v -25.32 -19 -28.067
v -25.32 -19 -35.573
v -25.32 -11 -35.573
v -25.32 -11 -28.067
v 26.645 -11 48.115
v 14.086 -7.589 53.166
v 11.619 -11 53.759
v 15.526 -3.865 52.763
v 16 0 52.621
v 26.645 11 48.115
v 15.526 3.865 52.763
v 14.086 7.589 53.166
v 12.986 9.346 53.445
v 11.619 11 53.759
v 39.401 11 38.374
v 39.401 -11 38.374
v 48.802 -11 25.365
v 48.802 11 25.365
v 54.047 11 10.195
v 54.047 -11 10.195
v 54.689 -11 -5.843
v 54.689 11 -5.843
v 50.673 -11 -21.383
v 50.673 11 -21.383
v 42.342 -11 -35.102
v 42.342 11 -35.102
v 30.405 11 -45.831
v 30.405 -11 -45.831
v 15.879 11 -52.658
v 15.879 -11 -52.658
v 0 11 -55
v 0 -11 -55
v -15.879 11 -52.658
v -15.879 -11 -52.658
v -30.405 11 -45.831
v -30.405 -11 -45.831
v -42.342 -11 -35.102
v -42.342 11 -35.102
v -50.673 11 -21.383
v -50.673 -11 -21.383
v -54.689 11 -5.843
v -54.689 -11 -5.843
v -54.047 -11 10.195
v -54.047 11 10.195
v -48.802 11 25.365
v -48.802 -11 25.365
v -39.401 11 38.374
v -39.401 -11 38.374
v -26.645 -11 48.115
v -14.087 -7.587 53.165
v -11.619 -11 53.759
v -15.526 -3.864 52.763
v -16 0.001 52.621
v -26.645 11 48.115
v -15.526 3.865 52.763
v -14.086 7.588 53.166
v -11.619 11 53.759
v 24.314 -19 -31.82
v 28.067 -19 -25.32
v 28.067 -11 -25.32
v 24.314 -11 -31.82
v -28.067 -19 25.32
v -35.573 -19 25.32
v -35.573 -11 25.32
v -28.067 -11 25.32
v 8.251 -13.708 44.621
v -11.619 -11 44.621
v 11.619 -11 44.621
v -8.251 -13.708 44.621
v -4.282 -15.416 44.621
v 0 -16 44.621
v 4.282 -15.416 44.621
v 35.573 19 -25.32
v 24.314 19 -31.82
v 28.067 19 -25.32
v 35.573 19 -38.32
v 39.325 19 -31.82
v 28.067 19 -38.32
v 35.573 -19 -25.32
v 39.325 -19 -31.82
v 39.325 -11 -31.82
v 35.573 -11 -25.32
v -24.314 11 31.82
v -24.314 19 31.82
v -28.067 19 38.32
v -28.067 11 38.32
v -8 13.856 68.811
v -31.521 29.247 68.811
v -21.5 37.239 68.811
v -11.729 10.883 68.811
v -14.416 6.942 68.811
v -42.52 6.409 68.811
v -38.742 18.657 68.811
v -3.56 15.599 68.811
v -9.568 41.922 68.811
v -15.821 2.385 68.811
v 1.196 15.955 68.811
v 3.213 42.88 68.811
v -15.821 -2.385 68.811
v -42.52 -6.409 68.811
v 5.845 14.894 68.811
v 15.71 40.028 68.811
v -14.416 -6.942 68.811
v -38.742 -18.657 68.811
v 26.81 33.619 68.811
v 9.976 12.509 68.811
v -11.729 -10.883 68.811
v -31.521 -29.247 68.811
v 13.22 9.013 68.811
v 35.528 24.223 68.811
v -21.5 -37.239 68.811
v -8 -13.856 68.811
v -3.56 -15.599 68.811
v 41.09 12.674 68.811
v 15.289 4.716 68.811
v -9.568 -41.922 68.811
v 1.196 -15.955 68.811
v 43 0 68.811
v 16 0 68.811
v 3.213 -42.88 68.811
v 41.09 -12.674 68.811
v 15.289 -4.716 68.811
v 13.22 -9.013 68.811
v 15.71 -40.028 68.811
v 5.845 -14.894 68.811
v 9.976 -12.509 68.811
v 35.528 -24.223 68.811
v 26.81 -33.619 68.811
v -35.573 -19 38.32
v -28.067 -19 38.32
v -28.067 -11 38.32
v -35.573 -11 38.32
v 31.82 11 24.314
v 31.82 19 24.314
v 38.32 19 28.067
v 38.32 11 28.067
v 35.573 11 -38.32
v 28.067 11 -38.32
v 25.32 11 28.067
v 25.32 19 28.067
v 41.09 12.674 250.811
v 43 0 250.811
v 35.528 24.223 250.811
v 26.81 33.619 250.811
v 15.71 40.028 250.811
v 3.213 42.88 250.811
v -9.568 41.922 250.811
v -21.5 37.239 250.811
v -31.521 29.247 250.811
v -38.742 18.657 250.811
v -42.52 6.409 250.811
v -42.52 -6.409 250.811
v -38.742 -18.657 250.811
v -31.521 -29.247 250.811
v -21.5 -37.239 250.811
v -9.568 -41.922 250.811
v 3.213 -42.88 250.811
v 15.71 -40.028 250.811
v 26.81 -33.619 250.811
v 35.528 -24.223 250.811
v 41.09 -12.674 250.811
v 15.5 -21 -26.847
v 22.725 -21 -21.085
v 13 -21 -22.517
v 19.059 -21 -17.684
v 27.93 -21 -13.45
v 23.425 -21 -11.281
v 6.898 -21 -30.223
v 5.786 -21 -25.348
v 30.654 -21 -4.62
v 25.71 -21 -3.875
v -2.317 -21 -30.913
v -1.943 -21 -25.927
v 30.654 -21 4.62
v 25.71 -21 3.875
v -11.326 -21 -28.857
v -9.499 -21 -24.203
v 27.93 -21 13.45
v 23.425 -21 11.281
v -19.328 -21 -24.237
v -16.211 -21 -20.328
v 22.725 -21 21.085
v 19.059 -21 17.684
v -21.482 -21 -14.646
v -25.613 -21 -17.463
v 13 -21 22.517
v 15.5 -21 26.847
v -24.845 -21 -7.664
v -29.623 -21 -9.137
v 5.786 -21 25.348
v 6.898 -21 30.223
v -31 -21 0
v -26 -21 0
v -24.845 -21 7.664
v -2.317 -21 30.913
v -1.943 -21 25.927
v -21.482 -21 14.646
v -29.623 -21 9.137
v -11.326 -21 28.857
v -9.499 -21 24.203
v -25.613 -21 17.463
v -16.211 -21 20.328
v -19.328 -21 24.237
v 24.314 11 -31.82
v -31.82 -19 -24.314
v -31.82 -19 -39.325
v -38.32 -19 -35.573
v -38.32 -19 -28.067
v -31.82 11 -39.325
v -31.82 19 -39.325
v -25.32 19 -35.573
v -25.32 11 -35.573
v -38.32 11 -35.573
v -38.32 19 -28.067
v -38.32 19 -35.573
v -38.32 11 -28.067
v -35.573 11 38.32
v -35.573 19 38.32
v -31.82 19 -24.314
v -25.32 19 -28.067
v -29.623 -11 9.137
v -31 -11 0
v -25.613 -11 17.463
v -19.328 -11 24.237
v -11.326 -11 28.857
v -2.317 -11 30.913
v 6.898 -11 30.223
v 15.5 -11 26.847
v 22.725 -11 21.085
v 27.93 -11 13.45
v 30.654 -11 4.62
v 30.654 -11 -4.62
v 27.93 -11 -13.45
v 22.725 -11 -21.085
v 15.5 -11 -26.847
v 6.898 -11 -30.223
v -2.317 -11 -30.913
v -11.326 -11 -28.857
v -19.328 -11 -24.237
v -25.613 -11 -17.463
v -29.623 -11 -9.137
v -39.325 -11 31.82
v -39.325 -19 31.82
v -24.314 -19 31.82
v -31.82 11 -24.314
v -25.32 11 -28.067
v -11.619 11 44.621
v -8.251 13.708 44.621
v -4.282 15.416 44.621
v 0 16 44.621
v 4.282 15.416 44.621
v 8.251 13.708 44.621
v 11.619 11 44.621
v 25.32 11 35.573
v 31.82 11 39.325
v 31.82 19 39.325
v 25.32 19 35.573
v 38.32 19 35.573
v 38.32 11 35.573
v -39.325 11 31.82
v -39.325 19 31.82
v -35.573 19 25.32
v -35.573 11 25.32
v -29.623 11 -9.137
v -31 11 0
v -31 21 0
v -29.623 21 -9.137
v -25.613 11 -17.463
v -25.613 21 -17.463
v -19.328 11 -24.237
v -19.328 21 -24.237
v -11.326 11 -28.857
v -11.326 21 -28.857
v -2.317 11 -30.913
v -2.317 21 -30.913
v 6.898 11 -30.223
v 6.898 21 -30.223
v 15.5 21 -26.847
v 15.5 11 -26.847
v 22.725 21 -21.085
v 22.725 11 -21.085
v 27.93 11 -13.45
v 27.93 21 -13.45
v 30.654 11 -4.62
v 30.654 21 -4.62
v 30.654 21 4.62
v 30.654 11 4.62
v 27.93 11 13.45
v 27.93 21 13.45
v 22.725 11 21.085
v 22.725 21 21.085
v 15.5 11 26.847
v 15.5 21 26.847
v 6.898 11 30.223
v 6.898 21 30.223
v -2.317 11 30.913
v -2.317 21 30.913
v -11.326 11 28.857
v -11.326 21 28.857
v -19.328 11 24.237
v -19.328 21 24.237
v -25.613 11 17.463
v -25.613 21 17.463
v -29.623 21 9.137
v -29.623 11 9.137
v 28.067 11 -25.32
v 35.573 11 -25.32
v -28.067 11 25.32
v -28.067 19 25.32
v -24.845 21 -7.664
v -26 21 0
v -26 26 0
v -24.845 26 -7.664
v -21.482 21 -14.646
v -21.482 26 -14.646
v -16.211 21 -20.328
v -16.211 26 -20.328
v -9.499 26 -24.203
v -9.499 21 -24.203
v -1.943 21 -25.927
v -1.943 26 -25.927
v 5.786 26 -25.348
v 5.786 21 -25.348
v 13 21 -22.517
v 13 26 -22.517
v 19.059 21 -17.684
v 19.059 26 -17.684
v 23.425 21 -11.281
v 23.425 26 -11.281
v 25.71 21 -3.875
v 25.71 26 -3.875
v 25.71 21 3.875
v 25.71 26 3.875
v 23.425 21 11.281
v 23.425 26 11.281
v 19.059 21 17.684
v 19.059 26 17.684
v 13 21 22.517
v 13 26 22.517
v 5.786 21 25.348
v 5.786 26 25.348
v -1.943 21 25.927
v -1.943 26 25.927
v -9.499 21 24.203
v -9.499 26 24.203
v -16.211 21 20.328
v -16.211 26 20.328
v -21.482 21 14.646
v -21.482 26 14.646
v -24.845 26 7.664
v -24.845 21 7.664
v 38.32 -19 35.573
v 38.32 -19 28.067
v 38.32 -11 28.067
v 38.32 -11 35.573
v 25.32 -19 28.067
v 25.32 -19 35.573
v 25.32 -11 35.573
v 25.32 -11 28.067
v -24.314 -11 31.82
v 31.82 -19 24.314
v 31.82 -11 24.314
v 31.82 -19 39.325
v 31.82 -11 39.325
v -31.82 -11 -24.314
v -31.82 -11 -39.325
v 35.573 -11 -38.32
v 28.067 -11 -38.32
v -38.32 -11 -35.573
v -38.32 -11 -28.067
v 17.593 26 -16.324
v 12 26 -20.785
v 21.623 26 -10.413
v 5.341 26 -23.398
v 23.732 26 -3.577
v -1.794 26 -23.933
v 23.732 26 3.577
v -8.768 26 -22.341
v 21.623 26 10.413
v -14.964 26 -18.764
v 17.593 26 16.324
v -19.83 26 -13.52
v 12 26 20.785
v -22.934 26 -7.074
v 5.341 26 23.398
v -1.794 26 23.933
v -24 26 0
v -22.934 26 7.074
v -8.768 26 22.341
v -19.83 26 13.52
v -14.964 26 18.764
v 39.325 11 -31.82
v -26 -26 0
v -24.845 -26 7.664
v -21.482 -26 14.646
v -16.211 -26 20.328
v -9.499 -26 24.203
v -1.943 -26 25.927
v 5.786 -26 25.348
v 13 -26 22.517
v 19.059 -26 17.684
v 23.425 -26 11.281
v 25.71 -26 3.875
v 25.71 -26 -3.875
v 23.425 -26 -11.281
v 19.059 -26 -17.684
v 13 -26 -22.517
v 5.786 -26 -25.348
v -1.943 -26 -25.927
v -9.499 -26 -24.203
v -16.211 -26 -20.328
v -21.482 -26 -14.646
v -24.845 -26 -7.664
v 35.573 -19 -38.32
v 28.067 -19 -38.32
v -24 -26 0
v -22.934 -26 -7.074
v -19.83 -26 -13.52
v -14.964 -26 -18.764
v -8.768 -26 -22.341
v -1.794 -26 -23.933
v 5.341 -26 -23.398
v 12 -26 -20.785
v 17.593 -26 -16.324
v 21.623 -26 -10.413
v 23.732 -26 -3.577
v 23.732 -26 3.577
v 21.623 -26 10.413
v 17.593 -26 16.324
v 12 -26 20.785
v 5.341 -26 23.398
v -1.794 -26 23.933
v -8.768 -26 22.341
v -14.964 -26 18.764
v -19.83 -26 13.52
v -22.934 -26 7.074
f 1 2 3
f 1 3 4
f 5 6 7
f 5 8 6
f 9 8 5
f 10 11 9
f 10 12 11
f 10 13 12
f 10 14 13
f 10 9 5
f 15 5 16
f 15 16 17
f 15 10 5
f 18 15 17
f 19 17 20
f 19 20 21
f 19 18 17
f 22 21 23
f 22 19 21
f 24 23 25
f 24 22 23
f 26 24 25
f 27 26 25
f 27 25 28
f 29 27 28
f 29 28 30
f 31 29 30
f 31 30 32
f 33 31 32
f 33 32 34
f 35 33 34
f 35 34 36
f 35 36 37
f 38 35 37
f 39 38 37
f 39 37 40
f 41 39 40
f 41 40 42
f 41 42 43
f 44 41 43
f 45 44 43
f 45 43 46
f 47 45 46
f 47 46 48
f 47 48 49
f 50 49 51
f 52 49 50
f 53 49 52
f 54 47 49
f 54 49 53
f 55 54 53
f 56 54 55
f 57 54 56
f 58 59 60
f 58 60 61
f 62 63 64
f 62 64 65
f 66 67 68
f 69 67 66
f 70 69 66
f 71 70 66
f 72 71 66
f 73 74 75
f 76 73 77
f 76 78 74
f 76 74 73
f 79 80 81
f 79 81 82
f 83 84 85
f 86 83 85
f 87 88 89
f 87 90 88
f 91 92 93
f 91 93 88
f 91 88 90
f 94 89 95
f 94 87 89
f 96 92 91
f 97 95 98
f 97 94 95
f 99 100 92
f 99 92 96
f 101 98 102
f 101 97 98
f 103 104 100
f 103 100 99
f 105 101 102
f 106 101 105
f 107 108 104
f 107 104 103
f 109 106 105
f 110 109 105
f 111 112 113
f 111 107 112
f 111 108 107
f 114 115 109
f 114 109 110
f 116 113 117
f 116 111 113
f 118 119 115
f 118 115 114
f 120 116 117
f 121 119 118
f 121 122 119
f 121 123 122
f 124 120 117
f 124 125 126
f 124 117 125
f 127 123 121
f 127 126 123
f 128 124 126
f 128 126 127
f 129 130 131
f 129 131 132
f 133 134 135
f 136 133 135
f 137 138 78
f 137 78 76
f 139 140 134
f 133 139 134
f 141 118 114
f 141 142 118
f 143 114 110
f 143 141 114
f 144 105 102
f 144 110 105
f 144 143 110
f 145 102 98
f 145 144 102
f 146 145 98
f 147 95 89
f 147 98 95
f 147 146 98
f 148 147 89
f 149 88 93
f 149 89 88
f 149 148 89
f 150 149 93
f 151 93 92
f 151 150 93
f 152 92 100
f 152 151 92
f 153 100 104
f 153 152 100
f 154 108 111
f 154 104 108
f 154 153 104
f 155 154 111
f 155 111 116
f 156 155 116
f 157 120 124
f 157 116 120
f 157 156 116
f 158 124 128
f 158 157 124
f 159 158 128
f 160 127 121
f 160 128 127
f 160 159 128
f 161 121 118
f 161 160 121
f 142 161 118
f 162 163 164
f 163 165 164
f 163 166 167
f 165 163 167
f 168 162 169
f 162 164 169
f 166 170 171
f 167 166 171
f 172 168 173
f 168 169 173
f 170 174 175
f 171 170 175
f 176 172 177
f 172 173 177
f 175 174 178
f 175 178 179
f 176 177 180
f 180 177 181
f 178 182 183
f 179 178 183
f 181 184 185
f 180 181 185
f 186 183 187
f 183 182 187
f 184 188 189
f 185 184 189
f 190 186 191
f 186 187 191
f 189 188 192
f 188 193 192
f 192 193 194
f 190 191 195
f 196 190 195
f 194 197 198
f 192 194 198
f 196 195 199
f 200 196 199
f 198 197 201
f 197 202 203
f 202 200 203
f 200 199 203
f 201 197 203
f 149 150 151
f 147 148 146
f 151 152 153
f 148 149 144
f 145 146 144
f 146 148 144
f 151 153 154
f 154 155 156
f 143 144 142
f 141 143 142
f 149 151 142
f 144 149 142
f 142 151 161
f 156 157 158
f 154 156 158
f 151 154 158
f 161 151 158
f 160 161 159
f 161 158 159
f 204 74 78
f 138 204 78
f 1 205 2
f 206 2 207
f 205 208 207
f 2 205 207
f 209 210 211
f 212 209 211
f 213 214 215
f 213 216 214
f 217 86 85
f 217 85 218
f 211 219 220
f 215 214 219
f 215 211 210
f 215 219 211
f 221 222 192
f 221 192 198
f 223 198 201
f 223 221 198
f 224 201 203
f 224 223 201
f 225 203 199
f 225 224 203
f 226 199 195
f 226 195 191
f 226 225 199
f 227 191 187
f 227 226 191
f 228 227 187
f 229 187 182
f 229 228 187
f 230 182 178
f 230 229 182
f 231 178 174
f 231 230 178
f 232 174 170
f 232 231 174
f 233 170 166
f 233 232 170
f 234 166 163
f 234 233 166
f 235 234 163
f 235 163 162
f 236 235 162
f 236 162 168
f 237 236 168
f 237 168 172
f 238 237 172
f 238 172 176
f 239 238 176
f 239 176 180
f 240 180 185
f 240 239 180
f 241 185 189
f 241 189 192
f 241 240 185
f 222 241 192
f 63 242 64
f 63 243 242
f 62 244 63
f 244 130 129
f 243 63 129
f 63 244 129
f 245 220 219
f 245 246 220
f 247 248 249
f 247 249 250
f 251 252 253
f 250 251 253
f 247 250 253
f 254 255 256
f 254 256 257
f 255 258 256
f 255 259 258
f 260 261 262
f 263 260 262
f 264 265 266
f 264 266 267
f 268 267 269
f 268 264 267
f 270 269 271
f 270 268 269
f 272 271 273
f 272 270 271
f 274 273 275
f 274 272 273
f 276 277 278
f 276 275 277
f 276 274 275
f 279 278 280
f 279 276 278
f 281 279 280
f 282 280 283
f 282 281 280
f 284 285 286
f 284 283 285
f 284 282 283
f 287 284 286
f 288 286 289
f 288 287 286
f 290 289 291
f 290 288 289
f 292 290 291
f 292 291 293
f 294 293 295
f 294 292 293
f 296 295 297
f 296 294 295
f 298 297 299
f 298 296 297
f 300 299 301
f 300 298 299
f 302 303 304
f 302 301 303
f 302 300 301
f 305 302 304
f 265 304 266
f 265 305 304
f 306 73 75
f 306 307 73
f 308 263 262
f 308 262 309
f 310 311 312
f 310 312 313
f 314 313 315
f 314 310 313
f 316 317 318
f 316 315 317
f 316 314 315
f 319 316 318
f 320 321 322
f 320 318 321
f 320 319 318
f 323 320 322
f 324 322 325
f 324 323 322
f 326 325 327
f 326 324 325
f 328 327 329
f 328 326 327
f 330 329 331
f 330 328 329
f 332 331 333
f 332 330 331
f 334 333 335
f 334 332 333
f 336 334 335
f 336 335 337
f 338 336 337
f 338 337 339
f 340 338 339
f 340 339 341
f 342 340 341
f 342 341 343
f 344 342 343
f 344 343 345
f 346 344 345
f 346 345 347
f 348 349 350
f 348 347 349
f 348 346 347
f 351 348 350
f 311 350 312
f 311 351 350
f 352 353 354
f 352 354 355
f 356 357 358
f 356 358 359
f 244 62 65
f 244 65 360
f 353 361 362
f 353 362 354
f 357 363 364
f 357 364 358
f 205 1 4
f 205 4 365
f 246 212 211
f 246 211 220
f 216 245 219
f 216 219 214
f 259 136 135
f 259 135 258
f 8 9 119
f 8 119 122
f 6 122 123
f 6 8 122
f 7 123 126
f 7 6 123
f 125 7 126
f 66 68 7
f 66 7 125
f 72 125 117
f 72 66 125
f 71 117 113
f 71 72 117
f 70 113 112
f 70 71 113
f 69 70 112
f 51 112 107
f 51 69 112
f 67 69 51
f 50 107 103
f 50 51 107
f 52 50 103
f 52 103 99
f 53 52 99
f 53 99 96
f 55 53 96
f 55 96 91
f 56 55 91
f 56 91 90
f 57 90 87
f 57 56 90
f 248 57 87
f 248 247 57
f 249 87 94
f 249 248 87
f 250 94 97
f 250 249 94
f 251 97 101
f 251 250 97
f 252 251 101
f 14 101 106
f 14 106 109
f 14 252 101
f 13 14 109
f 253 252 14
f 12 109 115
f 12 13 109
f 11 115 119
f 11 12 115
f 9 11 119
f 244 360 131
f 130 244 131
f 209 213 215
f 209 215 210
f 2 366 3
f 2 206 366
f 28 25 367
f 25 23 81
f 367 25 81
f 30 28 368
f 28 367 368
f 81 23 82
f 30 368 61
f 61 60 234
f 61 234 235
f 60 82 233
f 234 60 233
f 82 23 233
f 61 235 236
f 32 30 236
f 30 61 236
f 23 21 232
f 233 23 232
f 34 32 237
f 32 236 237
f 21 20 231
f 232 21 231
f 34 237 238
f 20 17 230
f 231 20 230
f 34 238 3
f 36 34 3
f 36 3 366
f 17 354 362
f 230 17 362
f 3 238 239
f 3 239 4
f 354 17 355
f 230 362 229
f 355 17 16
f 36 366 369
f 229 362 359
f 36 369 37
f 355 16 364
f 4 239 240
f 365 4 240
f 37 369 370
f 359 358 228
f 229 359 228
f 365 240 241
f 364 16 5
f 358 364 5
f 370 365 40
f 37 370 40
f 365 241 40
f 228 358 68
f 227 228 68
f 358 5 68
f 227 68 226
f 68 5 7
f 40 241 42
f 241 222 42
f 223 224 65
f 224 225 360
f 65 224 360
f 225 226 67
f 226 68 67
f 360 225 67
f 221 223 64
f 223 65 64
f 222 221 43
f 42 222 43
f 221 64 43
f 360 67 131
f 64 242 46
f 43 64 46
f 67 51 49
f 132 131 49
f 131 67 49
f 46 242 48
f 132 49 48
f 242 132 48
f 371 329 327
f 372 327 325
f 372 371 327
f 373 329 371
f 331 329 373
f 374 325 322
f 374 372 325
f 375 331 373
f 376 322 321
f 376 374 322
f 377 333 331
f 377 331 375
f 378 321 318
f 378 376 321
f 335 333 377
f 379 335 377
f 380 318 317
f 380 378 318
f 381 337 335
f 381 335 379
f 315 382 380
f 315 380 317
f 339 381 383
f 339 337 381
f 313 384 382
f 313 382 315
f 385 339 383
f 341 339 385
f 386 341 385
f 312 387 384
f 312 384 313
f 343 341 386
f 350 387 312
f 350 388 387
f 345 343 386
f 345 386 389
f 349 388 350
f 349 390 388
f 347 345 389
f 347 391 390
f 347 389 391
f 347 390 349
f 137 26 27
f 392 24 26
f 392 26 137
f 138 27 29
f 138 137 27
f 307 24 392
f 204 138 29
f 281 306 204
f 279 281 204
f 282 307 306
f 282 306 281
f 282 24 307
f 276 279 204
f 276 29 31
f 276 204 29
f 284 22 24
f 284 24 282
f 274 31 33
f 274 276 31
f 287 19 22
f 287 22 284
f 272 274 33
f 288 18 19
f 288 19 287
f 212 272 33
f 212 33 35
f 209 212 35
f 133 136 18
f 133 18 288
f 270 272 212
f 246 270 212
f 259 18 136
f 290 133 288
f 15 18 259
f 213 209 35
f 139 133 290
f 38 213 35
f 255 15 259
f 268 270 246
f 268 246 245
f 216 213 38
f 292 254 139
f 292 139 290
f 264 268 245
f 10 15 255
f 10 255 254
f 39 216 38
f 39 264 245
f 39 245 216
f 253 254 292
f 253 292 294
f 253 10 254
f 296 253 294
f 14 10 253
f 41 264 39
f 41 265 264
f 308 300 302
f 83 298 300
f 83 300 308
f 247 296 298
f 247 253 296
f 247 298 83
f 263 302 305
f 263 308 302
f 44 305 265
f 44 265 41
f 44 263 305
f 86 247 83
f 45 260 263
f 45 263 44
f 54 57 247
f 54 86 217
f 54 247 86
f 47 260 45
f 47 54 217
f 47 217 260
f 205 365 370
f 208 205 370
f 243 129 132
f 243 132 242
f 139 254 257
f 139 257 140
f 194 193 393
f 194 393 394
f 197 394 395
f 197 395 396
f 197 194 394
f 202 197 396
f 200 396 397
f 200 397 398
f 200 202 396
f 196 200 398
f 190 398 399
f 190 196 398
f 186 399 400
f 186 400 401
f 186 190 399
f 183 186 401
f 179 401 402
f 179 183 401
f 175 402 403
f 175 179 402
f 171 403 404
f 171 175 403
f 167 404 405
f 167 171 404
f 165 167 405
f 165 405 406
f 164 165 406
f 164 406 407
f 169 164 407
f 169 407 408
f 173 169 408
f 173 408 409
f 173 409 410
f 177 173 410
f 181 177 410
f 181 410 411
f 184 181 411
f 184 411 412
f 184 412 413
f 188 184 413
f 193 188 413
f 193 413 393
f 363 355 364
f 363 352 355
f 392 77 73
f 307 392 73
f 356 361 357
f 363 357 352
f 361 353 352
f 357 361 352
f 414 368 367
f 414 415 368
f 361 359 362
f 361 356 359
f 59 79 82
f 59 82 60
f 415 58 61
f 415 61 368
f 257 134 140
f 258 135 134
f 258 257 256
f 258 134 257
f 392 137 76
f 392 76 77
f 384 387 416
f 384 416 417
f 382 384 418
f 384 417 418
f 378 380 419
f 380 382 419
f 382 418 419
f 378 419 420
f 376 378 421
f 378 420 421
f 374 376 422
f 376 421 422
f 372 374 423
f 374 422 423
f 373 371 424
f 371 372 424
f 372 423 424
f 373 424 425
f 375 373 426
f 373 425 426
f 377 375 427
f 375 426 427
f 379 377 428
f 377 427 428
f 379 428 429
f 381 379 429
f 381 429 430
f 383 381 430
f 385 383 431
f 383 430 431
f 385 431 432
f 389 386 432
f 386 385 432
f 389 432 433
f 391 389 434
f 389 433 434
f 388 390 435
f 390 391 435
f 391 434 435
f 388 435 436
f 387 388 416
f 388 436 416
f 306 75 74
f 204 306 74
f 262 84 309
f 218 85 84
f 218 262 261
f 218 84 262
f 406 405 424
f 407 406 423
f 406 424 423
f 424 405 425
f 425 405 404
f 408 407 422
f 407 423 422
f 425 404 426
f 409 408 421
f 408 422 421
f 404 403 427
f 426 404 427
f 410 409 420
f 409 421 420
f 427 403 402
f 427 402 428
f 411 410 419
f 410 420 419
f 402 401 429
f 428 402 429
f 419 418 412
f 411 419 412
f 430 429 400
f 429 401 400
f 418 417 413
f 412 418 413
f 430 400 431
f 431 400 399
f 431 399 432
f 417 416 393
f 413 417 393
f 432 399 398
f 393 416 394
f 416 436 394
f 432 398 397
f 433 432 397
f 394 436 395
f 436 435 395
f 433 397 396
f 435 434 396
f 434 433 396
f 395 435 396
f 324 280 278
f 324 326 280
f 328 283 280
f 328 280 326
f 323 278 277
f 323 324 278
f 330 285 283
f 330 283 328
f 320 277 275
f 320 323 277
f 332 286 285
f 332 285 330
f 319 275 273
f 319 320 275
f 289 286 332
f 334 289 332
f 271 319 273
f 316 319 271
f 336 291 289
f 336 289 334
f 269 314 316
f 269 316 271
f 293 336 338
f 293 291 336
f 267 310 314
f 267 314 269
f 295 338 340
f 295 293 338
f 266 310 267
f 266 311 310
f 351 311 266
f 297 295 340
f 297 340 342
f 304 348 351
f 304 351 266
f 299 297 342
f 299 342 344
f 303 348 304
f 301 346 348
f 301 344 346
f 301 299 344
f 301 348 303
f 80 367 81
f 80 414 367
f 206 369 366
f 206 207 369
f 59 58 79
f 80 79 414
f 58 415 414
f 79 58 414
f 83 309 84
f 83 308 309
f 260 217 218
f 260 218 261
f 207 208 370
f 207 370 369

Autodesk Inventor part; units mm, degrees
ref_plane "YZ Plane" through (0, 0, 0) normal (1, 0, 0) x (0, 1, 0)
ref_plane "XZ Plane" through (0, 0, 0) normal (0, 1, 0) x (-1, 0, 0)
ref_plane "XY Plane" through (0, 0, 0) normal (0, 0, 1) x (1, 0, 0)
sketch "Sketch11" plane through (0, 0, 0) normal (0, 1, 0) x (-1, 0, 0)
  circle A0 centre (0, 0) radius 26
  circle A1 centre (0, 0) radius 24
  circle A2 centre (0, 0) radius 31
  circle A3 centre (0, 0) radius 55
  line L0 (35.5726, 38.3198) -> (39.3254, 31.8198)
  line L1 (39.3254, 31.8198) -> (35.5726, 25.3198)
  line L2 (35.5726, 25.3198) -> (28.067, 25.3198)
  line L3 (28.067, 25.3198) -> (24.3143, 31.8198)
  line L4 (24.3143, 31.8198) -> (28.067, 38.3198)
  line L5 (28.067, 38.3198) -> (35.5726, 38.3198)
  line L6 (0, 0) -> (31.8198, 31.8198) construction
  line L7 (0, 0) -> (45, 0) construction
  line L8 (35.5726, 38.3198) -> (28.067, 25.3198) construction
  line L9 (28.067, 38.3198) -> (35.5726, 25.3198) construction
  line L10 (39.3254, 31.8198) -> (24.3143, 31.8198) construction
  line L11 (0, 52.6213) -> (0, 85)
  line L12 (0, 85) -> (-16, 85)
  line L13 (-16, 85) -> (-16, 52.6213)
  line L14 (0, 64) -> (0, 58.5)
  line L15 (-16, 52.6213) -> (0, 52.6213)
  line L16 (0, 52.6213) -> (-16, 52.6213)
  line L17 (-16, 52.6213) -> (-16, 44.6213)
  line L18 (-16, 44.6213) -> (0, 44.6213)
  line L19 (0, 44.6213) -> (0, 52.6213)
  line L20 (0, 68.8106) -> (-43, 68.8106)
  line L21 (-43, 68.8106) -> (-43, 250.8106)
  line L22 (-43, 250.8106) -> (0, 250.8106)
  line L23 (0, 250.8106) -> (0, 68.8106)
  dimension "oOuterDia" = 110
  dimension "oPipeDia" = 52
  dimension "oPipeWall" = 2
  dimension "oPipeLenght" = 5
  dimension "oKdia" = 45
  dimension "d70" = 45
  dimension "oSW" = 13
  dimension "oCenterTop" = 85
  dimension "d78" = 16
  dimension "d86" = 8
  dimension "oActuatorDia" = 43
  dimension "oActuatorLenght" = 182
extrude "Extrusion12" add sketch "Sketch11" along normal mid plane 52 contours A0
extrude "Extrusion13" add sketch "Sketch11" along normal mid plane 42 contours A2
extrude "Extrusion14" add sketch "Sketch11" along normal mid plane 22 contours L17 L18 L19 L11 A3 | A3 L11 L15 | L15 L19 L18 L17 | L0 L1 L2 L3 L4 L5
extrude "Extrusion15" add sketch "Sketch11" along normal mid plane 38 contours L0 L1 L2 L3 L4 L5
pattern_circular "Circular Pattern2" count 4 over 360 about axis through (0, 0, 0) along (0, 1, 0) of "Extrusion15"
revolve "Revolution1" add sketch "Sketch11" angle 360 about axis through (0, 0, 52.6213) along (0, 0, 1) contours L13 L20 L11 A3 | A3 L11 L15 | L15 L19 L18 L17 | L13 L12 L11 L20
revolve "Revolution4" add sketch "Sketch11" angle 360 about axis through (0, 0, 250.8106) along (0, 0, -1) contours L20 L21 L22 L23 L12 L13 | L13 L12 L11 L20
equation "\"d65\" = -2 * oPipeLenght + oValveLenght"
equation "\"oValveLenght\" = 52"
properties part number "MANUAL SANITARY BUTTERFLY VALVE 304L DN50" material "304L"
